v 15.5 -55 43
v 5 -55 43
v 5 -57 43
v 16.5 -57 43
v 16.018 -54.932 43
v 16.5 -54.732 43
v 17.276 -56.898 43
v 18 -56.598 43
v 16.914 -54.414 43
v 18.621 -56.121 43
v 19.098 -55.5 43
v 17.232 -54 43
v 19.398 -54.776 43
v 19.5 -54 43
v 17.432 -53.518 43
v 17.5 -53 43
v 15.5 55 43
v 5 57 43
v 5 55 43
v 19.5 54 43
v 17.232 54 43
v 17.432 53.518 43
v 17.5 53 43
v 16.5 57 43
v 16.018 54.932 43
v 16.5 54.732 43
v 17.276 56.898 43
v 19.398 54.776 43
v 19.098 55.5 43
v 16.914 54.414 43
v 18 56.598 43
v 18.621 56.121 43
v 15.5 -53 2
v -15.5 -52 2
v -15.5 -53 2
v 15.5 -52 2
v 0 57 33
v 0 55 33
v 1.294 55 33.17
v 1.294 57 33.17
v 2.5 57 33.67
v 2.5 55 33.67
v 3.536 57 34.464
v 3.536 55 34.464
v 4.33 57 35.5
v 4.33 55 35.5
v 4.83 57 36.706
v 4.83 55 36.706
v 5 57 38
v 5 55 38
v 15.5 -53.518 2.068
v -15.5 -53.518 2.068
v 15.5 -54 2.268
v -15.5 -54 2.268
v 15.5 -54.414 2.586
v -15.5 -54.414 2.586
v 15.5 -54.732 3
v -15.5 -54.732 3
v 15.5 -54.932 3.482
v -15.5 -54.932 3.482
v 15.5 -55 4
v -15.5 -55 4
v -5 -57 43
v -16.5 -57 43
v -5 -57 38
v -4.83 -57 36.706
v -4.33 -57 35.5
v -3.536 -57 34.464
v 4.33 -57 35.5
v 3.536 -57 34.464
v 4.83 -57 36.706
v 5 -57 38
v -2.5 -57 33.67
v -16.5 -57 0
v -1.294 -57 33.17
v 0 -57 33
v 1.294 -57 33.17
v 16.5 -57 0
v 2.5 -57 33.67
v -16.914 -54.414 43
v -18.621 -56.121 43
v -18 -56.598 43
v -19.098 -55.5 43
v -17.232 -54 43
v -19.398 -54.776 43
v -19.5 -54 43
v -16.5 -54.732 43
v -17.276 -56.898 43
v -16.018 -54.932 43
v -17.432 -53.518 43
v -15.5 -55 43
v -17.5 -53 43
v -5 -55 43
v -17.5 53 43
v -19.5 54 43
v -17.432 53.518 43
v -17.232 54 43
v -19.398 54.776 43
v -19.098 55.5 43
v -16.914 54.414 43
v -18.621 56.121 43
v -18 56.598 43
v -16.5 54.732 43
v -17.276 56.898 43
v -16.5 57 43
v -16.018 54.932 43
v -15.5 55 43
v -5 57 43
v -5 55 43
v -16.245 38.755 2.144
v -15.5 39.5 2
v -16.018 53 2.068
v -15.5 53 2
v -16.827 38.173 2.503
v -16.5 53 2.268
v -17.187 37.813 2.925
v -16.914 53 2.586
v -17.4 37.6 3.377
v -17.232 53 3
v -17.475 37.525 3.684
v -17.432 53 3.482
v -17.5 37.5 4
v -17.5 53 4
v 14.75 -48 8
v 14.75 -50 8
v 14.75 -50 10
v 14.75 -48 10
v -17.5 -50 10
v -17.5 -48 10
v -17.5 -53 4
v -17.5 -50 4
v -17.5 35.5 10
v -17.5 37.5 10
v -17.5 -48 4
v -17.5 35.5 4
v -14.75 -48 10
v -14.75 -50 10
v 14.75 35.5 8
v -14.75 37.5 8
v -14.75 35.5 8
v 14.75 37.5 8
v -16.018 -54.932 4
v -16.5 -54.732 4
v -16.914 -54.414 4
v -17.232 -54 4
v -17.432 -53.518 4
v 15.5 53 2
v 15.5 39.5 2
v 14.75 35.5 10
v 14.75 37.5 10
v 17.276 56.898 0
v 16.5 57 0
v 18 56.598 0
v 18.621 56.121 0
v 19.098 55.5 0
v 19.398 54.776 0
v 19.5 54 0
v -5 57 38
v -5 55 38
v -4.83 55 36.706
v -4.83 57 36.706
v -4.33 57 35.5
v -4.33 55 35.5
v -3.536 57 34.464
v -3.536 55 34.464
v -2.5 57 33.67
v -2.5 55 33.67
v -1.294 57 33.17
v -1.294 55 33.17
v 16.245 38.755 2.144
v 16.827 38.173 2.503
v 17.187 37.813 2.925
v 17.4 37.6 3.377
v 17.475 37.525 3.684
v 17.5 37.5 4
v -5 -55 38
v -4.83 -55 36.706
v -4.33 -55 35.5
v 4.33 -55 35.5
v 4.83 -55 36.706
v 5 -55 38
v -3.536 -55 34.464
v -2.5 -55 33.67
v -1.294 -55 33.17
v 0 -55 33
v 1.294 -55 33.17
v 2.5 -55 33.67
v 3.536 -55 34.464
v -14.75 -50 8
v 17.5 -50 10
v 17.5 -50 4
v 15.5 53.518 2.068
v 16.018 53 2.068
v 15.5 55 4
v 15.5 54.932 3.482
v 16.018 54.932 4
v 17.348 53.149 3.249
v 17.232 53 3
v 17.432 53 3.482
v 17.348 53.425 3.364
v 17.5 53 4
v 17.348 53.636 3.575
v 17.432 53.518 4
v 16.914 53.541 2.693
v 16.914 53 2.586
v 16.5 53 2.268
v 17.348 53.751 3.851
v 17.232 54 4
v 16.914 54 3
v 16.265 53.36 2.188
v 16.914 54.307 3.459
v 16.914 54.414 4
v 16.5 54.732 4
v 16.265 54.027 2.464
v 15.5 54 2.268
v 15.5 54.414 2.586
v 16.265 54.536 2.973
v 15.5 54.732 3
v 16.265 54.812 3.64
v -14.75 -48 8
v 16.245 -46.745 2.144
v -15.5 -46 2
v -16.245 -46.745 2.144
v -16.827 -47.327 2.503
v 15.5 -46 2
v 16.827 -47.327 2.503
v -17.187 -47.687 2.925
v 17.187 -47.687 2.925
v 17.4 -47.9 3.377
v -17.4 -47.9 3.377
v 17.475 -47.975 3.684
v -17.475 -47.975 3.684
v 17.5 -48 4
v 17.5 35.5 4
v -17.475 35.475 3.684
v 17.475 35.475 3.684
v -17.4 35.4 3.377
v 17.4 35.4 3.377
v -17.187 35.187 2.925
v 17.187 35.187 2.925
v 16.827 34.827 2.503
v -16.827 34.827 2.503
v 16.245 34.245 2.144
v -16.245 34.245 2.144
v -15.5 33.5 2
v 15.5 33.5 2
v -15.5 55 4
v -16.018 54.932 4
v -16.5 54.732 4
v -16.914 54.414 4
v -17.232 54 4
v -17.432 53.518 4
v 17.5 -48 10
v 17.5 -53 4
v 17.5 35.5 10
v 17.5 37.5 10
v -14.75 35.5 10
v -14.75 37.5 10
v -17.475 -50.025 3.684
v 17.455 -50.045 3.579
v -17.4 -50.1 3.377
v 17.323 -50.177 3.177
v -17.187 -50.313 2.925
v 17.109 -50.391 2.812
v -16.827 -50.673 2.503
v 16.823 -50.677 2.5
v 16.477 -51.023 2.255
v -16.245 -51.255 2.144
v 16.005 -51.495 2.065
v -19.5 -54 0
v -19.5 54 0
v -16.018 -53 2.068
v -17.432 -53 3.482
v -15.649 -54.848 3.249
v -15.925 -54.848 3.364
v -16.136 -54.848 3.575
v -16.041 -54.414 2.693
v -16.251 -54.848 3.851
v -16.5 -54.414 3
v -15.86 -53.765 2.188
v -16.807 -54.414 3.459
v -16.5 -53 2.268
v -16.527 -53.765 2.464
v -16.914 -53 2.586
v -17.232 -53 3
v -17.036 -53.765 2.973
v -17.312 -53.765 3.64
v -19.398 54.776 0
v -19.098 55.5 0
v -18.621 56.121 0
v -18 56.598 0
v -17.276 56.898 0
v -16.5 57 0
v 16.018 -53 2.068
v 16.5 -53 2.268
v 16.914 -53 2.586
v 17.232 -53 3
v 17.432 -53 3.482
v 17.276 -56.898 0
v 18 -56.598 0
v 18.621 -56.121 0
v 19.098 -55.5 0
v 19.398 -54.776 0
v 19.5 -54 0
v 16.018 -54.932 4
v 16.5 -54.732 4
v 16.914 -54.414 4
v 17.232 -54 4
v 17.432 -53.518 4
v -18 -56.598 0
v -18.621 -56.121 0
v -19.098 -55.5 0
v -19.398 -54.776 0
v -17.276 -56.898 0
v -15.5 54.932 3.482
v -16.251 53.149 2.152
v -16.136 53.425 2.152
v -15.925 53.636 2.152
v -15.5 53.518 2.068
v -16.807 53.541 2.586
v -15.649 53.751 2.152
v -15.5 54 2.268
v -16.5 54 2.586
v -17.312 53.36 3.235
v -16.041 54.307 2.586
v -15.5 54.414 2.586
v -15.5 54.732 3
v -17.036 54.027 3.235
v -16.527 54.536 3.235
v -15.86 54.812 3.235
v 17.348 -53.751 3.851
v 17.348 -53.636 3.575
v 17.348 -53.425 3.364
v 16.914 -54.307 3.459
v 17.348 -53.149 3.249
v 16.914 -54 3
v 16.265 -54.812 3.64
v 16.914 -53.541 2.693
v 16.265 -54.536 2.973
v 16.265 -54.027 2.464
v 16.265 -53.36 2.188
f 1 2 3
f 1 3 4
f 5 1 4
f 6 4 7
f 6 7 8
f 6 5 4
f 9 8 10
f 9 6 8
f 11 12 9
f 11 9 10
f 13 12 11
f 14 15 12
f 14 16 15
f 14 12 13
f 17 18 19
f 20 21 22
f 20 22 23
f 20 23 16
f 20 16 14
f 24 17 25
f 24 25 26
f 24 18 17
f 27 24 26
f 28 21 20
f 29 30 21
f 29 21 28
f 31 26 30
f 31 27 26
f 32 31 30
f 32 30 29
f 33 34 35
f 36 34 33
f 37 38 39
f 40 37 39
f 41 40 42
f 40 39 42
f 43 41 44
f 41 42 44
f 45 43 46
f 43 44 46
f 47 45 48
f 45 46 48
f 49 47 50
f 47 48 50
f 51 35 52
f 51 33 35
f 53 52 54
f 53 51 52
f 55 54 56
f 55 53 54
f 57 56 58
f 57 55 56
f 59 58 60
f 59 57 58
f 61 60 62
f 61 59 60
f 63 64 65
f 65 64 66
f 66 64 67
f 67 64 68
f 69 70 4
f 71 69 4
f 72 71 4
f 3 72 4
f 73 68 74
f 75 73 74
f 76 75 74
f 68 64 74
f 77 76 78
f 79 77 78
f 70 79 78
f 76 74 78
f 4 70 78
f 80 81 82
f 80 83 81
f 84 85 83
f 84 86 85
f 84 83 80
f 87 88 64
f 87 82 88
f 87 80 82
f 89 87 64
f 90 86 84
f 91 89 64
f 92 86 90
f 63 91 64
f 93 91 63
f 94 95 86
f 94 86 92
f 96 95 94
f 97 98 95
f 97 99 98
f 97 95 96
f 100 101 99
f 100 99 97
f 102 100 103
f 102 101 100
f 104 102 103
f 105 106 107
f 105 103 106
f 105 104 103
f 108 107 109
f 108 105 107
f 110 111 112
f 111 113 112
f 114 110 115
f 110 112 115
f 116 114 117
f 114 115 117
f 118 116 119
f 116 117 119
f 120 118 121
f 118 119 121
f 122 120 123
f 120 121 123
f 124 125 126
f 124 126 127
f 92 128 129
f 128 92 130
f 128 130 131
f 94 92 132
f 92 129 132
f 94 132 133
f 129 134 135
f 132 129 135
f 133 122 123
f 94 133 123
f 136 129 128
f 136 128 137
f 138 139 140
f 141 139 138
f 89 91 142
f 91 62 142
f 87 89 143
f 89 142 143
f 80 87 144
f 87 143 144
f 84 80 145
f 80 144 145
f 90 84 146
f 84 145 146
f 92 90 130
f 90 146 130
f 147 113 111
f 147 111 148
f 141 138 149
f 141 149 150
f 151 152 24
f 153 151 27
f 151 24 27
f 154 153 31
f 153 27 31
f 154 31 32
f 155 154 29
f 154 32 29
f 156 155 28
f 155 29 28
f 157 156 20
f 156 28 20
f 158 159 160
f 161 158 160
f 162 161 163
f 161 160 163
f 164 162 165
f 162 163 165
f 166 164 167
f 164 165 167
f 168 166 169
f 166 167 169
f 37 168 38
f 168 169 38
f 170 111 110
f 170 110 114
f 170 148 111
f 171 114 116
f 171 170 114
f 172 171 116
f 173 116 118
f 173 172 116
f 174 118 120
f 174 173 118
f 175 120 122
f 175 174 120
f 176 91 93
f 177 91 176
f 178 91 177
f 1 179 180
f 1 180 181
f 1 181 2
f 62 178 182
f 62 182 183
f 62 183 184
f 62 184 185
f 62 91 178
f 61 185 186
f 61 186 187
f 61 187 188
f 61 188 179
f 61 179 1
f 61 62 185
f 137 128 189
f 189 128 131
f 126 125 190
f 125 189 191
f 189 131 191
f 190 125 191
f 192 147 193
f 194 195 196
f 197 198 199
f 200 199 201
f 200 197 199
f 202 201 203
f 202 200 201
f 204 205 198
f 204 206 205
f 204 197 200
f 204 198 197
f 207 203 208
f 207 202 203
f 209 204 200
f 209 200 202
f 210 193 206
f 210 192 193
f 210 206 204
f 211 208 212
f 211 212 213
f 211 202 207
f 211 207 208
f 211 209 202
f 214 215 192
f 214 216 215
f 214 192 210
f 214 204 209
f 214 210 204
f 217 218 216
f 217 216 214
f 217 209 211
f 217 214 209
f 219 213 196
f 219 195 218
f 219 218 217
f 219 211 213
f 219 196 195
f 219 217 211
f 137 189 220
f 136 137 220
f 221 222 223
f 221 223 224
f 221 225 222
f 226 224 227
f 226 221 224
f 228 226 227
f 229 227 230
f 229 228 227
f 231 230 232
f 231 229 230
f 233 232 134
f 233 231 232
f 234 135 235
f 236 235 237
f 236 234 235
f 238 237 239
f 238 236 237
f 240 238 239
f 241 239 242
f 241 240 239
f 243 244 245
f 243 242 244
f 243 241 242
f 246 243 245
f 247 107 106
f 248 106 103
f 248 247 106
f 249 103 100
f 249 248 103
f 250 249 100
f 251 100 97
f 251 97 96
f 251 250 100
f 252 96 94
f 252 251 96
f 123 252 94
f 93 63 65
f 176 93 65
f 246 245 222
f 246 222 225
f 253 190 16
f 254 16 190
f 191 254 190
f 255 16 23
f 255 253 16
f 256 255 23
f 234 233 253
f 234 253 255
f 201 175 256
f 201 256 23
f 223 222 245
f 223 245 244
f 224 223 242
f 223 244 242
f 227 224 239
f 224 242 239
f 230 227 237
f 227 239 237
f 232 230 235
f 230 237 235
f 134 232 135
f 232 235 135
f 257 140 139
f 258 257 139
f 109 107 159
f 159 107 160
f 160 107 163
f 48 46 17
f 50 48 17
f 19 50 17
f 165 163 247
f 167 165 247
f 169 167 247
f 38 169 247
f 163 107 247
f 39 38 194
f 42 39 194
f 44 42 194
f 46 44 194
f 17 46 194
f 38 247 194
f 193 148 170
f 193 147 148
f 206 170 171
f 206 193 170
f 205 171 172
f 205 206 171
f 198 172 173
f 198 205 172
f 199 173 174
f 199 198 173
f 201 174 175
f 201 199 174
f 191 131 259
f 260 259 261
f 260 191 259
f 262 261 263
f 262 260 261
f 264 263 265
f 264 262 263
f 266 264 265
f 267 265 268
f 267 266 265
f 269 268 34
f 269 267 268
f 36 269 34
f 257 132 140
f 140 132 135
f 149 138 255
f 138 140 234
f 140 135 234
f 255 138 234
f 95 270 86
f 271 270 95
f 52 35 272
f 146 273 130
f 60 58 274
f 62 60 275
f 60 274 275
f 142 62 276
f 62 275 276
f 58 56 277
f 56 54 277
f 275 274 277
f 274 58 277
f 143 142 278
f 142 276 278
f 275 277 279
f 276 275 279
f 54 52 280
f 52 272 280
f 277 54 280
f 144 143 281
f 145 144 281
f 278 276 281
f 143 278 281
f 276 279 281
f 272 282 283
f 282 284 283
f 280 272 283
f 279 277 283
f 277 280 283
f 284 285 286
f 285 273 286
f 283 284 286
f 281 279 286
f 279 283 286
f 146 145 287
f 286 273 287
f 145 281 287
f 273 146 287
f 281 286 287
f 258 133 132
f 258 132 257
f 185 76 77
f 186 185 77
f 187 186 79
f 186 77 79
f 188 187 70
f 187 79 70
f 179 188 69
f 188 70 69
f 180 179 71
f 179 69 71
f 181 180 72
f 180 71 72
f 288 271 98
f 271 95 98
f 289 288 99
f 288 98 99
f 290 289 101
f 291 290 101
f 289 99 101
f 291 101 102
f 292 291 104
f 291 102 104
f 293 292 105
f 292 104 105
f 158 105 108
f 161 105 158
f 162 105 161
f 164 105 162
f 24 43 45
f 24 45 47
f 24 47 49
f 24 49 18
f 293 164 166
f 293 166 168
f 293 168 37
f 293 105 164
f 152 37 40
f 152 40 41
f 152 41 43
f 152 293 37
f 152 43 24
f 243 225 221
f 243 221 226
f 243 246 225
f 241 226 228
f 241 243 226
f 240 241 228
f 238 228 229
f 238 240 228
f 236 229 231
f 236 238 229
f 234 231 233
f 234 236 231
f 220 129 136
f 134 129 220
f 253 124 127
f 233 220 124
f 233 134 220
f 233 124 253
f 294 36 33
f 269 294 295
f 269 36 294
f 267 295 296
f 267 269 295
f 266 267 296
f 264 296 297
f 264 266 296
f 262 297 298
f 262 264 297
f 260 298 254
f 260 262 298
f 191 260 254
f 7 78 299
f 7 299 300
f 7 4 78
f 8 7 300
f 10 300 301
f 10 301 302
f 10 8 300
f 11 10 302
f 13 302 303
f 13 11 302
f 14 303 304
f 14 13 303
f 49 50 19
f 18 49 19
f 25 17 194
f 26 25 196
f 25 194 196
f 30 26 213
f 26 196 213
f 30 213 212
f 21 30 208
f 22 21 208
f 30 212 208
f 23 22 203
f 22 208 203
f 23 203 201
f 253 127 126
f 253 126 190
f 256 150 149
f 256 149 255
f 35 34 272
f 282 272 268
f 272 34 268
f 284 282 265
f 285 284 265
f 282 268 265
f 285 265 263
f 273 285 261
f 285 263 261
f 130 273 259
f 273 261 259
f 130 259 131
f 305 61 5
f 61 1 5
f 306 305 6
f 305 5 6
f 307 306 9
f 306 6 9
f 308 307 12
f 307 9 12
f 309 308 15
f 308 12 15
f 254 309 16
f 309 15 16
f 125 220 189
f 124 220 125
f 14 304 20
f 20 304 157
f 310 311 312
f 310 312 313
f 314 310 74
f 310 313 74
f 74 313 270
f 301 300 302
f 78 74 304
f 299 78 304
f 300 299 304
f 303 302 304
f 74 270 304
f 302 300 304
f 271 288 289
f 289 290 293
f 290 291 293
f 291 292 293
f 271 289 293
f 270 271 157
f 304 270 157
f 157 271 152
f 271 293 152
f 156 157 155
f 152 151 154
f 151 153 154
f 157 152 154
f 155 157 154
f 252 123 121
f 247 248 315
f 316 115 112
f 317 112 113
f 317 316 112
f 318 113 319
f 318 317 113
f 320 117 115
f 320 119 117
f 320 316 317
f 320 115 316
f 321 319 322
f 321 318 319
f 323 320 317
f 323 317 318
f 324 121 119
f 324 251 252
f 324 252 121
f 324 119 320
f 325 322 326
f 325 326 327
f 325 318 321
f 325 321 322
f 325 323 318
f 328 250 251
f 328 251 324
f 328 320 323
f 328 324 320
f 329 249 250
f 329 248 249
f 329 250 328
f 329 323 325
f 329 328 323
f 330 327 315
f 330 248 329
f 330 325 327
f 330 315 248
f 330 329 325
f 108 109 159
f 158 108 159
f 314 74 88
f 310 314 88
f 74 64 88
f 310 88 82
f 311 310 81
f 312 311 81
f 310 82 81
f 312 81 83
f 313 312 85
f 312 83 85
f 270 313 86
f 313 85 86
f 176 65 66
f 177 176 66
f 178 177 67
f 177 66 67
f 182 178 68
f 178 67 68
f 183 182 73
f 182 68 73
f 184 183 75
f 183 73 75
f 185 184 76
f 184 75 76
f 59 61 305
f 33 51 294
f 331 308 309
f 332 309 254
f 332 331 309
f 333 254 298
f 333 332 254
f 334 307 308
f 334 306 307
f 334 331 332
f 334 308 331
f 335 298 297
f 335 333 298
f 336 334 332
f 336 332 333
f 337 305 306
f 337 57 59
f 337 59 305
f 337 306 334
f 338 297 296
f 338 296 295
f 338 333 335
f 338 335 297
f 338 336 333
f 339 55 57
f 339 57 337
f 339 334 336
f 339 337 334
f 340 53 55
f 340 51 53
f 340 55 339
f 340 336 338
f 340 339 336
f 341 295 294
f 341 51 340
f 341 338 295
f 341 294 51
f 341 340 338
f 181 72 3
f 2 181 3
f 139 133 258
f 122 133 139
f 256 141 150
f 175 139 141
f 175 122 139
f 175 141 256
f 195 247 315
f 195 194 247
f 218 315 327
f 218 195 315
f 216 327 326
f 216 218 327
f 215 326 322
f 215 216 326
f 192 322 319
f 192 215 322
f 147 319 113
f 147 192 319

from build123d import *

# Parameters (mm, degrees)
F4_W      = 39
F4_H      = 114
F5_DEPTH  = 43
F6_T      = -2
F7_W      = 35
F7_H      = 2
F8_DEPTH  = 6
F9_W      = 2.75
F9_H      = 2
F10_DEPTH = 2
F11_R     = 2
F13_DEPTH = 114.001
F14_R     = 3


with BuildPart() as f5:
    # F4 (on Top) → F5 (new body)
    with BuildSketch(Plane.XY):
        Rectangle(F4_W, F4_H)
    extrude(amount=F5_DEPTH)

    # F6
    f6_openings = [f5.faces().sort_by_distance(p)[0] for p in [
        (0, 0, 43),
    ]]
    offset(amount=F6_T, openings=f6_openings)

    # F7 (on face) → F8 (join)
    with BuildSketch(Plane.XY.offset(2)):
        with Locations((0, 36.5)):
            Rectangle(F7_W, F7_H)
        with Locations((0, -49)):
            Rectangle(F7_W, F7_H)
    extrude(amount=F8_DEPTH)

    # F9 (on face) → F10 (join)
    with BuildSketch(Plane.XY.offset(8)):
        with Locations((-16.125, 36.5)):
            Rectangle(F9_W, F9_H)
        with Locations((16.125, 36.5)):
            Rectangle(F9_W, F9_H)
        with Locations((-16.125, -49)):
            Rectangle(F9_W, F9_H)
        with Locations((16.125, -49)):
            Rectangle(F9_W, F9_H)
    extrude(amount=F10_DEPTH)

    # F11
    f11_edges = [f5.edges().sort_by_distance(p)[0] for p in [
        (-17.5, 55, 22.5),
        (-17.5, 46.25, 2),
        (0, 55, 2),
        (-17.5, -6.25, 2),
        (0, -48, 2),
        (-17.5, -52.5, 2),
        (0, -50, 2),
        (0, -55, 2),
        (-17.5, -55, 22.5),
        (17.5, -55, 22.5),
        (17.5, -52.5, 2),
        (17.5, -6.25, 2),
        (0, 37.5, 2),
        (0, 35.5, 2),
        (17.5, 46.25, 2),
        (17.5, 55, 22.5),
    ]]
    fillet(f11_edges, radius=F11_R)

    # F12 (on face) → F13 (cut, through all)
    with BuildSketch(Plane.XZ.offset(57)):
        with BuildLine():
            Line((-5, 43), (-5, 38))
            ThreePointArc((-5, 38), (-3.5355339142, 41.5355338977), (-2.33e-08, 43))
            Line((-2.33e-08, 43), (-5, 43))
        make_face()
        with BuildLine():
            ThreePointArc((-5, 38), (-3.5355339059, 34.4644660941), (0, 33))
            ThreePointArc((0, 33), (3.5355339059, 34.4644660941), (5, 38))
            ThreePointArc((5, 38), (3.5355338977, 41.5355339142), (-2.33e-08, 43))
            ThreePointArc((-2.33e-08, 43), (-3.5355339142, 41.5355338977), (-5, 38))
        make_face()
        with BuildLine():
            ThreePointArc((-2.33e-08, 43), (3.5355338977, 41.5355339142), (5, 38))
            Line((5, 38), (5, 43))
            Line((5, 43), (-2.33e-08, 43))
        make_face()
    extrude(amount=-F13_DEPTH, mode=Mode.SUBTRACT)

    # F14
    f14_edges = [f5.edges().sort_by_distance(p)[0] for p in [
        (19.5, -57, 21.5),
        (19.5, 57, 21.5),
        (-19.5, 57, 21.5),
        (-19.5, -57, 21.5),
    ]]
    fillet(f14_edges, radius=F14_R)


solid = f5.part
